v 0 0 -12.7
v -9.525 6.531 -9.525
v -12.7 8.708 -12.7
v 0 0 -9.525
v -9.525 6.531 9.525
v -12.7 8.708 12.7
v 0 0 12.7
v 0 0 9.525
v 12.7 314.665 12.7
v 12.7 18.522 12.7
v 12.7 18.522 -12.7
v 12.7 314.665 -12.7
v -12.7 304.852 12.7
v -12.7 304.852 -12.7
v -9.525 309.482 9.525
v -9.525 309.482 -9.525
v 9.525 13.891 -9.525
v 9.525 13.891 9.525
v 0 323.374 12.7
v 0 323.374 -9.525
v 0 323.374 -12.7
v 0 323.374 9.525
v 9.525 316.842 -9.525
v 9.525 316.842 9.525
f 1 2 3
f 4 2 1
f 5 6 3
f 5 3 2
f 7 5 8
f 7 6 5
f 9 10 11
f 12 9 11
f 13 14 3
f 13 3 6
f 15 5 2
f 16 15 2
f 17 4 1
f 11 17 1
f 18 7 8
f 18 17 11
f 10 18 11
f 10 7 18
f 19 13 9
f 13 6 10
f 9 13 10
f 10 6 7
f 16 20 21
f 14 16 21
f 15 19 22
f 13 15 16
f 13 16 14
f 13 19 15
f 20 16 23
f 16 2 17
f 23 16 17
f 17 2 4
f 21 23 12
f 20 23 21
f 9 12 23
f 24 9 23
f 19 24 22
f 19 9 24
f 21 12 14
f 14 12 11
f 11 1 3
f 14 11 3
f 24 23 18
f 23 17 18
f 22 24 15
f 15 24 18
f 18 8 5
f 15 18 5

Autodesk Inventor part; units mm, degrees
ref_plane "YZ Plane" through (0, 0, 0) normal (1, 0, 0) x (0, 1, 0)
ref_plane "XZ Plane" through (0, 0, 0) normal (0, 1, 0) x (-1, 0, 0)
ref_plane "XY Plane" through (0, 0, 0) normal (0, 0, 1) x (1, 0, 0)
sketch "Sketch1" plane through (0, 0, 0) normal (0, 1, 0) x (-1, 0, 0)
  line L0 (-12.7, -12.7) -> (12.7, -12.7)
  line L1 (12.7, -12.7) -> (12.7, 12.7)
  line L2 (12.7, 12.7) -> (-12.7, 12.7)
  line L3 (-12.7, 12.7) -> (-12.7, -12.7)
  line L4 (-12.7, -12.7) -> (12.7, 12.7) construction
  line L5 (12.7, -12.7) -> (-12.7, 12.7) construction
  line L6 (9.525, 9.525) -> (9.525, -9.525)
  line L7 (9.525, -9.525) -> (-9.525, -9.525)
  line L8 (-9.525, -9.525) -> (-9.525, 9.525)
  line L9 (-9.525, 9.525) -> (9.525, 9.525)
  point P0 (0, 0)
  dimension "d0" = 25.4
  dimension "d1" = 25.4
  dimension "d2" = 3.175
extrude "Extrusion1" add sketch "Sketch1" along normal blind 323.3735
sketch "Sketch2" plane through (-12.7, 0, 12.7) normal (0, 0, 1) x (1, 0, 0)
  line L0 (0, 0) -> (25.4, 0) projected
  line L1 (25.4, 0) -> (25.4, 323.3735) projected
  line L2 (0, 323.3735) -> (25.4, 323.3735) projected
  line L3 (0, 0) -> (0, 323.3735) projected
  line L4 (163.521, 219.9589) -> (12.7, 323.3735)
  line L5 (12.7, 323.3735) -> (-138.121, 103.4146)
  line L6 (-138.121, 103.4146) -> (12.7, 0)
  line L7 (12.7, 0) -> (163.521, 219.9589)
  point P0 (0, 8.7081)
  point P1 (25.4, 18.5218)
  point P2 (0, 304.8517)
  point P3 (25.4, 314.6654)
  dimension "d5" = 266.7
extrude "Extrusion2" cut sketch "Sketch2" against normal through all contours L3 L6 L0 | L7 L1 L0 | L3 L2 L5 | L4 L2 L1
properties part number "STRU_014_BilletCrossbar3_Angled" material "Aluminum 6061"
